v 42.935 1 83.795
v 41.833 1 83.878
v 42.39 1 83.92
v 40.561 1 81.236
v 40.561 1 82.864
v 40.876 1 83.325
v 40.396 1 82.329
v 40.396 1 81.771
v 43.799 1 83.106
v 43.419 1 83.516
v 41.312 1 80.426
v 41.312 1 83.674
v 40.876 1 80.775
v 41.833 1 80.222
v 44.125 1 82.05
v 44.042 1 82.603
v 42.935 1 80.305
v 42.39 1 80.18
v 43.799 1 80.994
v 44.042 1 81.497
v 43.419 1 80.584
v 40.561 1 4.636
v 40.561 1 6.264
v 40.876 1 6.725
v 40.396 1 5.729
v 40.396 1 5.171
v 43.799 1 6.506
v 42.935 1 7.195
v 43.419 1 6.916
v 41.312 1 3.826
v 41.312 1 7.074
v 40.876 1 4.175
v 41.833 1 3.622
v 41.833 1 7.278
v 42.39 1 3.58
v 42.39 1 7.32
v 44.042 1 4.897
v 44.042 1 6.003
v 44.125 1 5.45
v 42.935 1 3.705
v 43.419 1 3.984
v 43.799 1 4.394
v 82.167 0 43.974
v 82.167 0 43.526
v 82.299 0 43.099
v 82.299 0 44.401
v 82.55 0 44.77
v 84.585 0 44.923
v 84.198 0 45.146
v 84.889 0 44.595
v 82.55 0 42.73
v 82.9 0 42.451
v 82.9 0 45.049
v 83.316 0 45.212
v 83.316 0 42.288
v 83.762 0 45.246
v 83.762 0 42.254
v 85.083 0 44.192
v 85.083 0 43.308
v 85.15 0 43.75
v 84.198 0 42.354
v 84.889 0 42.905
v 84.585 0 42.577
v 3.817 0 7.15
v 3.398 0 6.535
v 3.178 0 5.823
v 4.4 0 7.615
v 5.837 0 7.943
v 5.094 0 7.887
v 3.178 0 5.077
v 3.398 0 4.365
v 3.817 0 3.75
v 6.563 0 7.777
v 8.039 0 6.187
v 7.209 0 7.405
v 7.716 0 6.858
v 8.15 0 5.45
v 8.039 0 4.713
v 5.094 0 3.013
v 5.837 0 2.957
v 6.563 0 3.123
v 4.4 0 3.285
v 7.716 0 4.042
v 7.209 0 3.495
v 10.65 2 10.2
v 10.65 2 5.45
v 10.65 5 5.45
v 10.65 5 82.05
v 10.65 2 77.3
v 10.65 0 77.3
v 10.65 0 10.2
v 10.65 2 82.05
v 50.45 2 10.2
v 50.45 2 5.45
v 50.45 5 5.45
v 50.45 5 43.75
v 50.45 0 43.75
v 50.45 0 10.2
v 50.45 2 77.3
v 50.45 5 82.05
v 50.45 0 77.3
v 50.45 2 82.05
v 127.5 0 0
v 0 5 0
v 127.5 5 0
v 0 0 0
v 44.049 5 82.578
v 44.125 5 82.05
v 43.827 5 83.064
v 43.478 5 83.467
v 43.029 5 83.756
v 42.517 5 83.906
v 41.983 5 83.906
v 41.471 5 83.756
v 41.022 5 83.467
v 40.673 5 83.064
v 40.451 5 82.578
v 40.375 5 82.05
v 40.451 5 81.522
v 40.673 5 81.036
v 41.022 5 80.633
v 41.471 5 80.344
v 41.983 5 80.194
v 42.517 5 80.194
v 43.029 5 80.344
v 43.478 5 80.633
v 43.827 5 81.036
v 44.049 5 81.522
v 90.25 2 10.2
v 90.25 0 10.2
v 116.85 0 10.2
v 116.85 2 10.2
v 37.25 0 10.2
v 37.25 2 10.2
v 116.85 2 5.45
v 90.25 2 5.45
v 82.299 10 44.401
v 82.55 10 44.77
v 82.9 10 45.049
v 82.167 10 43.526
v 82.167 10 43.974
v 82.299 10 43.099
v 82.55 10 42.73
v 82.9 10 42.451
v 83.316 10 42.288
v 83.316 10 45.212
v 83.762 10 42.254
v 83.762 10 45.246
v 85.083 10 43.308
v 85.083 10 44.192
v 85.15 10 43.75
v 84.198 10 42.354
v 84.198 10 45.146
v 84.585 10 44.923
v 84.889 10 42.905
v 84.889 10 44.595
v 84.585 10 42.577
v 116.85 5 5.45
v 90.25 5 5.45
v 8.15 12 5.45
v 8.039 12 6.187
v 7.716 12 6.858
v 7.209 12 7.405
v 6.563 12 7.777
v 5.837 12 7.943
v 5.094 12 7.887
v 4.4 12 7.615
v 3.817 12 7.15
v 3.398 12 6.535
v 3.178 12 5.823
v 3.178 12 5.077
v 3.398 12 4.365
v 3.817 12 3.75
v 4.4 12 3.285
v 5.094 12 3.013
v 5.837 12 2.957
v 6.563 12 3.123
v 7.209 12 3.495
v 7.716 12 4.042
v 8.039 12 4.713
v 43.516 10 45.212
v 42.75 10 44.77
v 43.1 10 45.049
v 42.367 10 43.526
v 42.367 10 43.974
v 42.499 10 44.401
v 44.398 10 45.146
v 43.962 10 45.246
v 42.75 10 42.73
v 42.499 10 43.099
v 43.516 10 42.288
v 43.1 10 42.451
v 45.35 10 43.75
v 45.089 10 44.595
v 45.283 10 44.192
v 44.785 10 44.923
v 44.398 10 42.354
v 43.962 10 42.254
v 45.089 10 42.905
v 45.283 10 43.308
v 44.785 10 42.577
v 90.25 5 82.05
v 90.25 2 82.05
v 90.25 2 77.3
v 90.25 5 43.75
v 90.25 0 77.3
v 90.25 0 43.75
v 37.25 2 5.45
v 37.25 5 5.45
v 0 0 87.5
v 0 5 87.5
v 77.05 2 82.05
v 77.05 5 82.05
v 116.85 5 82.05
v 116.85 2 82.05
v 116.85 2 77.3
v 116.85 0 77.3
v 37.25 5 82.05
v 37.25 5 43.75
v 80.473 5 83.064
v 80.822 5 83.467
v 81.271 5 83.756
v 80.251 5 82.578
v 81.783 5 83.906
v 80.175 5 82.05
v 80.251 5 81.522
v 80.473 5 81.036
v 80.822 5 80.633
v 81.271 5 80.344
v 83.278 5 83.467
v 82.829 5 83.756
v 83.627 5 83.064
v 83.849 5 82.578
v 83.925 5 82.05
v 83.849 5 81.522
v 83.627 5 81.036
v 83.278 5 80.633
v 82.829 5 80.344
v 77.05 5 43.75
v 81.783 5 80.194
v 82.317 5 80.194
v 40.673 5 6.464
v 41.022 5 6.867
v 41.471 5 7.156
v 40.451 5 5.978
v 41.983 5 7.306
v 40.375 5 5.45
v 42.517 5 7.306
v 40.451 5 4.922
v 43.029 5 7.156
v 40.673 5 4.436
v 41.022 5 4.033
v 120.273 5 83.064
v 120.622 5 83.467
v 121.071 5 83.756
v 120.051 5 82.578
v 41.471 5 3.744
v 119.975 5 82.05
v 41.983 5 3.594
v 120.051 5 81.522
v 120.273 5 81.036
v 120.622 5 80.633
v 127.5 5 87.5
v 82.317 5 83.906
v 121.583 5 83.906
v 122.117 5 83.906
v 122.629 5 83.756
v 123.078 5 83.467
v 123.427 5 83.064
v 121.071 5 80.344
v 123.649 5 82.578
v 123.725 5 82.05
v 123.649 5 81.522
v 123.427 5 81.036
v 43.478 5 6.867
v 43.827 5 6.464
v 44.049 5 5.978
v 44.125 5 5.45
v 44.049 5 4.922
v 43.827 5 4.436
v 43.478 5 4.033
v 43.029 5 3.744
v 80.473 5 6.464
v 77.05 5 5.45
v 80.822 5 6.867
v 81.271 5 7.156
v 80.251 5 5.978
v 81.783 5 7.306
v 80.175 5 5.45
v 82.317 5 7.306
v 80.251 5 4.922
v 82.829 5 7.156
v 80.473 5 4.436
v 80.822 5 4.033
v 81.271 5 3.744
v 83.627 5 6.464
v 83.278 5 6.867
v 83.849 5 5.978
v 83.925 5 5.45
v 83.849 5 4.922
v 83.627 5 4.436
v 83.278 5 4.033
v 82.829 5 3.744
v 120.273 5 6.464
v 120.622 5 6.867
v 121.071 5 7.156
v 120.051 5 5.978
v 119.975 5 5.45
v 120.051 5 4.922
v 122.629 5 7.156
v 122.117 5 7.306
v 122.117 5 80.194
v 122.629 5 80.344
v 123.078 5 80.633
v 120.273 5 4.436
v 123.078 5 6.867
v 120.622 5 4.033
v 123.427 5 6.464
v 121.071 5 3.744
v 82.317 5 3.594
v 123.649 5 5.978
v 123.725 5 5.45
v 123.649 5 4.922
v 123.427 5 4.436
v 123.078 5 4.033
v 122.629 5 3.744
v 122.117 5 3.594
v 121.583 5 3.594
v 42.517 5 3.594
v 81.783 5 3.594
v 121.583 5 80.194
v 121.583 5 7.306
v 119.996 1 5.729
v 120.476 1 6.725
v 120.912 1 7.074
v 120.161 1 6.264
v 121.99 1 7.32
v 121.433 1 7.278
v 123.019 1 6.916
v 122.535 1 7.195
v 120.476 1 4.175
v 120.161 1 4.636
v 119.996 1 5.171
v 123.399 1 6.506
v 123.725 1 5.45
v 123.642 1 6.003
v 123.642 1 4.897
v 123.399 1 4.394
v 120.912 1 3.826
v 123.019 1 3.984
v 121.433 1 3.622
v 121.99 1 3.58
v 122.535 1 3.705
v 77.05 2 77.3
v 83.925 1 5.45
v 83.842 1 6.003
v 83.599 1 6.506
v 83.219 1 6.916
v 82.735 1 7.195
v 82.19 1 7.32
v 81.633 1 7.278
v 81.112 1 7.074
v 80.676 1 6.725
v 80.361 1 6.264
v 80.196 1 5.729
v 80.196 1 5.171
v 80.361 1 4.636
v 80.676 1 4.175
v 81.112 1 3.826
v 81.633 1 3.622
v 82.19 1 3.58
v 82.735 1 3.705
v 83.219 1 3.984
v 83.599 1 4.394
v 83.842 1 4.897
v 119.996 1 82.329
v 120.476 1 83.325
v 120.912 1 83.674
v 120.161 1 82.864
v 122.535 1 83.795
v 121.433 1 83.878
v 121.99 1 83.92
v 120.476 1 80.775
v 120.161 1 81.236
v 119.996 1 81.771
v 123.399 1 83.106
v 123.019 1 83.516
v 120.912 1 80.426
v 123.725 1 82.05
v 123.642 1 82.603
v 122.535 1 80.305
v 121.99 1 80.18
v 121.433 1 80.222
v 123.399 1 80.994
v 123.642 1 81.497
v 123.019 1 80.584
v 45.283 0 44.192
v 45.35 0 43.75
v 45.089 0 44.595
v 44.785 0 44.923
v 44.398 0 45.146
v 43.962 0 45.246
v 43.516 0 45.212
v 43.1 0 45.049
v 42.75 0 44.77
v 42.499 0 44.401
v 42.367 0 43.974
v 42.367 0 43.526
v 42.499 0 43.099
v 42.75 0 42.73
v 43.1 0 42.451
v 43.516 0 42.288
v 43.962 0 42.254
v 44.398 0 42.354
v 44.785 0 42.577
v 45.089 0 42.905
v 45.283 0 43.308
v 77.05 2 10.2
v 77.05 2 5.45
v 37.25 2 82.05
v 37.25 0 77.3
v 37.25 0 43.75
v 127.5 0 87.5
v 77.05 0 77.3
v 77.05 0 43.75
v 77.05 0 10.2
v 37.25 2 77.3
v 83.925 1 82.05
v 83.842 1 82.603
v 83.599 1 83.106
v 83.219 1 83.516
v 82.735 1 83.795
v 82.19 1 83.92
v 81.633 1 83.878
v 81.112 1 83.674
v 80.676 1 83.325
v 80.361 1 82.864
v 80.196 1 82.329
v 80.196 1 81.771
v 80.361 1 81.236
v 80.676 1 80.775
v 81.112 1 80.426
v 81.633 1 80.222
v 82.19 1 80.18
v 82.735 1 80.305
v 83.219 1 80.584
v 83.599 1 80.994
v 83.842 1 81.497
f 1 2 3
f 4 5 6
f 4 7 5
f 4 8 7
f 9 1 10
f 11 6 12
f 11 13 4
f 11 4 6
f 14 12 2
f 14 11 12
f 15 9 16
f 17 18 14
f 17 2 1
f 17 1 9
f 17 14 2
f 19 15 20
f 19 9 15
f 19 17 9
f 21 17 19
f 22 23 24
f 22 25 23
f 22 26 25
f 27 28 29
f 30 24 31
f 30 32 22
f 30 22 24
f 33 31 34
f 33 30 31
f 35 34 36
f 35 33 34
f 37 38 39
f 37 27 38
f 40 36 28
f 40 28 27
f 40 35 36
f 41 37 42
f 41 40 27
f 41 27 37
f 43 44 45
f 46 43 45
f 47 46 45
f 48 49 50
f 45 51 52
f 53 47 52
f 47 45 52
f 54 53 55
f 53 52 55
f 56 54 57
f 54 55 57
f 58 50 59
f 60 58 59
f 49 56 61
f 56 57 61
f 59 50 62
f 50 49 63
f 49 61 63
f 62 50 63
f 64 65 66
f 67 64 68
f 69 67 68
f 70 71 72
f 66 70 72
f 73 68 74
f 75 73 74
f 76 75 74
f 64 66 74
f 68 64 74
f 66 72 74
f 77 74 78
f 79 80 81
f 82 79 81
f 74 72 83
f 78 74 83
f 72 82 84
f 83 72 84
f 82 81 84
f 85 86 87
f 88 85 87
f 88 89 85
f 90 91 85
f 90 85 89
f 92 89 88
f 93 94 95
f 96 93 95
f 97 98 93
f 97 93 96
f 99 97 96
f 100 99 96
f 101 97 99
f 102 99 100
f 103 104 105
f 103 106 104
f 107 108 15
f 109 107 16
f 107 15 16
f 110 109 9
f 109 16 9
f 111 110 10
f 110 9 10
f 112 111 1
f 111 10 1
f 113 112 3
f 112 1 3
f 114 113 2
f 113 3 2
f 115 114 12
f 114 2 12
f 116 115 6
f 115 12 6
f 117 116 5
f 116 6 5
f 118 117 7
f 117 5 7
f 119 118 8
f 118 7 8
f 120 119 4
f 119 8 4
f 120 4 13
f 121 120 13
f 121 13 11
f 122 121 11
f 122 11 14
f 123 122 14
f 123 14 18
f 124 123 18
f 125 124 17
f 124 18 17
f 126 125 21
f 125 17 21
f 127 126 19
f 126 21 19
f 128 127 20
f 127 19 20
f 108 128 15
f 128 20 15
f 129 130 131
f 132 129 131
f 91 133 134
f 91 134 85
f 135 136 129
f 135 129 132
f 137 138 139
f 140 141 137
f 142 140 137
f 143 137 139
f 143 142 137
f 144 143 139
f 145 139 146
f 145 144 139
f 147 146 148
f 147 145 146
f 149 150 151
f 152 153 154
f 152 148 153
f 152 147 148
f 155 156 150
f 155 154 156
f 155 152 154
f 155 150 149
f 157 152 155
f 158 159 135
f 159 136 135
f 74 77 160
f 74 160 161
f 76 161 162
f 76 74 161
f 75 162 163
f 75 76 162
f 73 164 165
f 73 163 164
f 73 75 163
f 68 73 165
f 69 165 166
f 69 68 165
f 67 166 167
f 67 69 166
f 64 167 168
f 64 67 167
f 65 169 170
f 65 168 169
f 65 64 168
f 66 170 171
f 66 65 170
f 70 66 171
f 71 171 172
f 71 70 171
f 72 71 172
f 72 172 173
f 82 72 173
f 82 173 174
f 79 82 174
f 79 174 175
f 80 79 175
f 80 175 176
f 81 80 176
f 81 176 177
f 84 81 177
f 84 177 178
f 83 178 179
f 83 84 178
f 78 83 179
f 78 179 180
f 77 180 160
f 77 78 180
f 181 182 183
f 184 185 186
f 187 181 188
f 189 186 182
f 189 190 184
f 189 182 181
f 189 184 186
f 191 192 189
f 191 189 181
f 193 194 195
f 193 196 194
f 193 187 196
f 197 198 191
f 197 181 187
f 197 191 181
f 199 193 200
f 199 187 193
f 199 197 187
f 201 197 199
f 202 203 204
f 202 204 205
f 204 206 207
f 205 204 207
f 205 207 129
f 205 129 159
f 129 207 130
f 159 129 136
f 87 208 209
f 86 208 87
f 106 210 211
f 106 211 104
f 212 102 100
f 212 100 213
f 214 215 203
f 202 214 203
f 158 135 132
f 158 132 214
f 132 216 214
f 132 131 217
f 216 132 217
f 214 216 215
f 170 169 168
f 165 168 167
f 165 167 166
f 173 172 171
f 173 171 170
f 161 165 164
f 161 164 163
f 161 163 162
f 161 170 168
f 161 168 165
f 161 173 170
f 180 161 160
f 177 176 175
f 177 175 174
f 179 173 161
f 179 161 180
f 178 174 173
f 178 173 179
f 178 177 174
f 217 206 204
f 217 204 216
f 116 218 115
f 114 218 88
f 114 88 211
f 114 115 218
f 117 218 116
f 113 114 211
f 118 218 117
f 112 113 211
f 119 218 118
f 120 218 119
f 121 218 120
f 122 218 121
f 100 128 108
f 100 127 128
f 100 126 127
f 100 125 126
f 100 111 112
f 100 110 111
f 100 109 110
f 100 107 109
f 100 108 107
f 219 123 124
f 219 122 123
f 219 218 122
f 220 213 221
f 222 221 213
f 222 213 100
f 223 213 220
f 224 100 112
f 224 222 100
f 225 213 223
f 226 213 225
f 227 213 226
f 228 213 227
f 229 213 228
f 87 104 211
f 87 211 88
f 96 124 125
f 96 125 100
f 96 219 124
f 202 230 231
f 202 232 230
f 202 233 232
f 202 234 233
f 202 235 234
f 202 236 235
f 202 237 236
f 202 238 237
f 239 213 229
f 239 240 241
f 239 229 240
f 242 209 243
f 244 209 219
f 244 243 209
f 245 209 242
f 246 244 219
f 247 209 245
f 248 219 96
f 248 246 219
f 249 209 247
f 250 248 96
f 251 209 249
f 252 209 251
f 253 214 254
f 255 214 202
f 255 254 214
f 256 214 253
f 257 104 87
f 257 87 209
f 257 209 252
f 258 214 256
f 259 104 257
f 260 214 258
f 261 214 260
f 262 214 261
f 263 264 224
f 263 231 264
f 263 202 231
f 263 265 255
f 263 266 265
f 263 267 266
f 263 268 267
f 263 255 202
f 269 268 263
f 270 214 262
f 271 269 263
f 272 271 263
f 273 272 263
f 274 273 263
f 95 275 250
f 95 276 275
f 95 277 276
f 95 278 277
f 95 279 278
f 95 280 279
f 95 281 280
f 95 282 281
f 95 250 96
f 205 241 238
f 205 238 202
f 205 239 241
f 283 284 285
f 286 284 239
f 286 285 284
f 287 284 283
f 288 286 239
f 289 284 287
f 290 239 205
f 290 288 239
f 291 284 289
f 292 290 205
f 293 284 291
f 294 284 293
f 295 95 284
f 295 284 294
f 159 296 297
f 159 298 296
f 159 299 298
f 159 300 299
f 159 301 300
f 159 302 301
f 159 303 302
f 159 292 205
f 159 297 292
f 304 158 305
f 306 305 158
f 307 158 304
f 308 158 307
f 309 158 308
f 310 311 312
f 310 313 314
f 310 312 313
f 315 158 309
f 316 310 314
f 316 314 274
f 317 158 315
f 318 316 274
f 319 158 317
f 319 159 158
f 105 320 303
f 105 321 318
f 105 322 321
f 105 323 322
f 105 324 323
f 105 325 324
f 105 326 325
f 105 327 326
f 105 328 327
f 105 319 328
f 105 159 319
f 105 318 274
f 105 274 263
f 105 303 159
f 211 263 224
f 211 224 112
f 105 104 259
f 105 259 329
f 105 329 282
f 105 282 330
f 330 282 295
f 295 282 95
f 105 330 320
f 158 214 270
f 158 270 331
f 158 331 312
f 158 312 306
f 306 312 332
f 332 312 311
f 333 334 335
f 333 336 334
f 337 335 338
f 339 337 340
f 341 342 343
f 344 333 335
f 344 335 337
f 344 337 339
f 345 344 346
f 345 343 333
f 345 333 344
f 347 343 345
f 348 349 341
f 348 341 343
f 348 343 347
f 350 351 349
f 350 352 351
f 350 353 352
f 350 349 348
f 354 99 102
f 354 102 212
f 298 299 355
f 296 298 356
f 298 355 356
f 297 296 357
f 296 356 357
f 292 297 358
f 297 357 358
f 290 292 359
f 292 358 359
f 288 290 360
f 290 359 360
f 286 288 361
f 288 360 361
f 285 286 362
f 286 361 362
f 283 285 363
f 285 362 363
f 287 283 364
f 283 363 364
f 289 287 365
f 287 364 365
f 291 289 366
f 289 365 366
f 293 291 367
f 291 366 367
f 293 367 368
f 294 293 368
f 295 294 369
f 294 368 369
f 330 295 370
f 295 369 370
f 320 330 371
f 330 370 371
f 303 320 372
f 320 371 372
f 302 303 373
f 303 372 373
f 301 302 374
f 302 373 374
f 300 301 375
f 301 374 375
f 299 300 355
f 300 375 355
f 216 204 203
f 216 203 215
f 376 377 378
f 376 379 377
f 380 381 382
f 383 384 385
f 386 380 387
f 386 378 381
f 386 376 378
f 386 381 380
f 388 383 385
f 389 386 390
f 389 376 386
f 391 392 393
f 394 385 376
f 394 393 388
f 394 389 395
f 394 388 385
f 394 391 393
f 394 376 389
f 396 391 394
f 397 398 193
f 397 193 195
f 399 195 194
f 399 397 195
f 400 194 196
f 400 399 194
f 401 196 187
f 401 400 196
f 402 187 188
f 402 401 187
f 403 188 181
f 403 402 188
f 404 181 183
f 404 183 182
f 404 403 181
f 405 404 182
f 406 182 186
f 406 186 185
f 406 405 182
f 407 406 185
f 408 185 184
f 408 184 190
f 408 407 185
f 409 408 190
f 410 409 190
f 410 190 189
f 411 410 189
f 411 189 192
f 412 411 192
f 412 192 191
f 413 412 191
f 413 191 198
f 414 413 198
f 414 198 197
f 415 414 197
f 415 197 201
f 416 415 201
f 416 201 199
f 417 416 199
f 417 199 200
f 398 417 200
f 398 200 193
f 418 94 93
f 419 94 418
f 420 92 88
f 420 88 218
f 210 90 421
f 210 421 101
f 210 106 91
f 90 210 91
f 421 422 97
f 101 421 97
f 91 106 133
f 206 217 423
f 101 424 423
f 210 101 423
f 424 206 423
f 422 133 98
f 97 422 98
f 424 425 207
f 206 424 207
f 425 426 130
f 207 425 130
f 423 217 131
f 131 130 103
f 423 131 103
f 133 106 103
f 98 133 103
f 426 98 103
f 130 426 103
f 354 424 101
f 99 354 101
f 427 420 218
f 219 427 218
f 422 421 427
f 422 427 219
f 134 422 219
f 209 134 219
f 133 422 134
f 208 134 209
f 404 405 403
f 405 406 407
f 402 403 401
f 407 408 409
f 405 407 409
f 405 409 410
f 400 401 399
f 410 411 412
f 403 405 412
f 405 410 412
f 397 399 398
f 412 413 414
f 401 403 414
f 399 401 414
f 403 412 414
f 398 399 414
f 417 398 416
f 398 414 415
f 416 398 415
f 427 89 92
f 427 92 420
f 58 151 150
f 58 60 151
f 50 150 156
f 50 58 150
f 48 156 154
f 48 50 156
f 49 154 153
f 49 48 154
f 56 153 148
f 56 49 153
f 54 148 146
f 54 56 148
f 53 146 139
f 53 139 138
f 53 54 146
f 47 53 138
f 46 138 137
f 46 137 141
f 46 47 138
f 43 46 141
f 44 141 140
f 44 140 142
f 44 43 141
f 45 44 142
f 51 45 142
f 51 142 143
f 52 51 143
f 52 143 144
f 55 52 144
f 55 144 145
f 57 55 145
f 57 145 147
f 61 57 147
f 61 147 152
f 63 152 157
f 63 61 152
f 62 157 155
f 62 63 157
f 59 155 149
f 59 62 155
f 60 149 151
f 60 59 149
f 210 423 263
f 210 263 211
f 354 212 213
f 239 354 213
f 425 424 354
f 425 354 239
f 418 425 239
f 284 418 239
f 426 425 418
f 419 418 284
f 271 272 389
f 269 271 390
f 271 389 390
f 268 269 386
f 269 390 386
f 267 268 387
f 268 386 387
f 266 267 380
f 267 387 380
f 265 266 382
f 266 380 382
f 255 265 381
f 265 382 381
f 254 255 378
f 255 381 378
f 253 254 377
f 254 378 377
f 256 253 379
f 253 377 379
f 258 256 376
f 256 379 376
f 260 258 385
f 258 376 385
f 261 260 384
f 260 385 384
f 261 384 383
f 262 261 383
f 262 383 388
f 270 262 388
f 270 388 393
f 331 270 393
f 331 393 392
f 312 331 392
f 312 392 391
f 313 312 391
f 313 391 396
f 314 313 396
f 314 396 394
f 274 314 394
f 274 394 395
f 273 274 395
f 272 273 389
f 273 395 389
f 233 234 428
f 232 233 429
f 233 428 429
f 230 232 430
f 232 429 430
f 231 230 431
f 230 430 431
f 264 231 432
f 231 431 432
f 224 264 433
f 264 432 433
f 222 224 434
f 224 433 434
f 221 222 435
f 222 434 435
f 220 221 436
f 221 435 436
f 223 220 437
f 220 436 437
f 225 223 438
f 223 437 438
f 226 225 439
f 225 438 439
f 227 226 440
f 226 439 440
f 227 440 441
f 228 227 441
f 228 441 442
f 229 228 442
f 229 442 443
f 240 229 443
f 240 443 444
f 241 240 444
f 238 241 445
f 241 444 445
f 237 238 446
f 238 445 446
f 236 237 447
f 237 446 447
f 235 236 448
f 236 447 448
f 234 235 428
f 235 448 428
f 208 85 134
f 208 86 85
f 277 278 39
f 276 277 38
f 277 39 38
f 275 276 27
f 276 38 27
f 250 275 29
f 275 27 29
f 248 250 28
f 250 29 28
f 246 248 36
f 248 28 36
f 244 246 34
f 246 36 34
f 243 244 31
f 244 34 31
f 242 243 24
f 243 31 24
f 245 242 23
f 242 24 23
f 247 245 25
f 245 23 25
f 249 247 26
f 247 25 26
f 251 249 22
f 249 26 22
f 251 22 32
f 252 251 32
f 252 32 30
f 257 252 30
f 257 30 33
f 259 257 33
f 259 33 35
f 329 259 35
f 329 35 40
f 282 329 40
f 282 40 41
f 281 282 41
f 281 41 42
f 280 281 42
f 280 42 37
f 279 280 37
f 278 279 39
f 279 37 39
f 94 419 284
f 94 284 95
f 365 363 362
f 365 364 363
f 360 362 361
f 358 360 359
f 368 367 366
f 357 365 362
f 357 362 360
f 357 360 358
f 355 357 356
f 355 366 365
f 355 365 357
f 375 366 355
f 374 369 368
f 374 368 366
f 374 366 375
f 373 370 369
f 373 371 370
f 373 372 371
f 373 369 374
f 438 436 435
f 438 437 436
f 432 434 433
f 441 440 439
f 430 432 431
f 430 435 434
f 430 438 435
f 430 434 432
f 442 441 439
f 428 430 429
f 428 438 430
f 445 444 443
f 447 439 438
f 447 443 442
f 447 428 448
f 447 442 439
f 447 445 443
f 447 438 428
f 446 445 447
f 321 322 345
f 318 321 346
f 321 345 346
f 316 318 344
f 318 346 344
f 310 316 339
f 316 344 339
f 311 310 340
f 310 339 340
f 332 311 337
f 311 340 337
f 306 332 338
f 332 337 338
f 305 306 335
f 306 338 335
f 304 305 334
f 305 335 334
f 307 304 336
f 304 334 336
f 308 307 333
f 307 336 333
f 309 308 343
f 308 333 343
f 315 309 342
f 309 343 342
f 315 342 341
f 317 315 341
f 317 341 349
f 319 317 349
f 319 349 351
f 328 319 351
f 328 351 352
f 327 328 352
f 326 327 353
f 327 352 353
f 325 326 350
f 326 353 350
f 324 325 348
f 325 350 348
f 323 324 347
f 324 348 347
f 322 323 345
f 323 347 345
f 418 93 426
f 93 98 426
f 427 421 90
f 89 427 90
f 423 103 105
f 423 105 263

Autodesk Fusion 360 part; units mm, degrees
sketch "Sketch1" plane through (0, 0, 0) normal (0, 1, 0) x (1, 0, 0)
  line L0 (0, 0) -> (127.5, 0)
  line L1 (127.5, 0) -> (127.5, -87.5)
  line L2 (127.5, -87.5) -> (0, -87.5)
  line L3 (0, -87.5) -> (0, 0)
  line L4 (0, -43.75) -> (127.5, -43.75) construction
  line L5 (63.75, 0) -> (63.75, -87.5) construction
  line L6 (63.75, -43.75) -> (77.05, -43.75) construction
  line L7 (63.75, -43.75) -> (63.75, -5.45) construction
  line L8 (63.75, -5.45) -> (77.05, -5.45) construction
  line L9 (77.05, -5.45) -> (50.45, -5.45)
  line L10 (50.45, -5.45) -> (50.45, -82.05)
  line L11 (50.45, -82.05) -> (77.05, -82.05)
  line L12 (77.05, -82.05) -> (77.05, -5.45)
  line L13 (50.45, -43.75) -> (37.25, -43.75)
  line L14 (37.25, -43.75) -> (37.25, -5.45)
  line L15 (37.25, -5.45) -> (10.65, -5.45)
  line L16 (10.65, -5.45) -> (10.65, -82.05)
  line L17 (10.65, -82.05) -> (37.25, -82.05)
  line L18 (37.25, -82.05) -> (37.25, -5.45)
  line L19 (77.05, -43.75) -> (90.25, -43.75)
  line L20 (90.25, -43.75) -> (90.25, -5.45)
  line L21 (90.25, -5.45) -> (116.85, -5.45)
  line L22 (116.85, -5.45) -> (116.85, -82.05)
  line L23 (116.85, -82.05) -> (90.25, -82.05)
  line L24 (90.25, -82.05) -> (90.25, -5.45)
  line L25 (37.25, -43.75) -> (23.95, -43.75)
  line L26 (37.25, -5.45) -> (37.25, -10.2)
  line L27 (37.25, -10.2) -> (10.65, -10.2)
  line L28 (10.65, -10.2) -> (10.65, -5.45)
  line L29 (10.65, -5.45) -> (37.25, -5.45)
  line L30 (37.25, -5.45) -> (37.25, -10.2)
  line L31 (50.45, -5.45) -> (50.45, -10.2)
  line L32 (50.45, -10.2) -> (77.05, -10.2)
  line L33 (77.05, -10.2) -> (77.05, -5.45)
  line L34 (77.05, -5.45) -> (50.45, -5.45)
  line L35 (50.45, -5.45) -> (50.45, -10.2)
  line L36 (90.25, -5.45) -> (90.25, -10.2)
  line L37 (90.25, -10.2) -> (116.85, -10.2)
  line L38 (116.85, -10.2) -> (116.85, -5.45)
  line L39 (116.85, -5.45) -> (90.25, -5.45)
  line L40 (90.25, -5.45) -> (90.25, -10.2)
  line L41 (10.65, -82.05) -> (37.25, -82.05)
  line L42 (37.25, -82.05) -> (37.25, -77.3)
  line L43 (37.25, -77.3) -> (10.65, -77.3)
  line L44 (10.65, -77.3) -> (10.65, -82.05)
  line L45 (50.45, -82.05) -> (77.05, -82.05)
  line L46 (77.05, -82.05) -> (77.05, -77.3)
  line L47 (77.05, -77.3) -> (50.45, -77.3)
  line L48 (50.45, -77.3) -> (50.45, -82.05)
  line L49 (116.85, -82.05) -> (90.25, -82.05)
  line L50 (90.25, -82.05) -> (90.25, -77.3)
  line L51 (90.25, -77.3) -> (116.85, -77.3)
  line L52 (116.85, -77.3) -> (116.85, -82.05)
  line L53 (77.05, -43.75) -> (83.65, -43.75)
  circle A0 centre (83.65, -43.75) radius 1.5
  line L54 (37.25, -43.75) -> (43.85, -43.75)
  circle A1 centre (43.85, -43.75) radius 1.5
  line L55 (10.65, -5.45) -> (5.65, -5.45)
  circle A2 centre (5.65, -5.45) radius 2.5
  line L56 (37.25, -5.45) -> (42.25, -5.45)
  circle A3 centre (42.25, -5.45) radius 1.875
  line L57 (77.05, -5.45) -> (82.05, -5.45)
  circle A4 centre (82.05, -5.45) radius 1.875
  line L58 (116.85, -5.45) -> (121.85, -5.45)
  circle A5 centre (121.85, -5.45) radius 1.875
  line L59 (116.85, -82.05) -> (121.85, -82.05)
  circle A6 centre (121.85, -82.05) radius 1.875
  line L60 (77.05, -82.05) -> (82.05, -82.05)
  circle A7 centre (82.05, -82.05) radius 1.875
  line L61 (37.25, -82.05) -> (42.25, -82.05)
  circle A8 centre (42.25, -82.05) radius 1.875
  dimension "d1" = 127.5
  dimension "d2" = 87.5
  dimension "d3" = 13.3
  dimension "d4" = 38.3
  dimension "d5" = 13.3
  dimension "d6" = 26.6
  dimension "d7" = 76.6
  dimension "d8" = 13.2
  dimension "d9" = 38.3
  dimension "d10" = 26.6
  dimension "d11" = 76.6
  dimension "d12" = 13.2
  dimension "d13" = 38.3
  dimension "d14" = 26.6
  dimension "d15" = 76.6
  dimension "d16" = 13.3
  dimension "d17" = 4.75
  dimension "d18" = 4.75
  dimension "d19" = 4.75
  dimension "d20" = 4.75
  dimension "d21" = 26.6
  dimension "d22" = 4.75
  dimension "d23" = 4.75
  dimension "d42" = 6.6
  dimension "d43" = 3
  dimension "d44" = 6.6
  dimension "d45" = 3
  dimension "d50" = 5
  dimension "d51" = 5
  dimension "d56" = 5
  dimension "d57" = 3.75
  dimension "d58" = 5
  dimension "d59" = 3.75
  dimension "d60" = 5
  dimension "d61" = 3.75
  dimension "d62" = 5
  dimension "d63" = 3.75
  dimension "d64" = 5
  dimension "d65" = 3.75
  dimension "d66" = 5
  dimension "d67" = 3.75
extrude "Extrude12" add sketch "Sketch1" along normal blind 15 contours A2 makes body 1
extrude "Extrude10" add sketch "Sketch1" along normal blind 10 separate body contours L13 L54 A1 | L13 L54 A1 makes body 2
extrude "Extrude1" add sketch "Sketch1" along normal blind 5 separate body contours L0 L1 L2 L3 | A5 | A6 | L19 L53 A0 | L19 L53 A0 | A7 | A8 | A2 | A3 | L13 L54 A1 | L13 L54 A1 | A4 makes body 3
extrude "Extrude2" add sketch "Sketch1" along normal blind 1 contours L20 L21 L22 L24 L36 L37 L38 L39 L40 bodies 3
extrude "Extrude3" add sketch "Sketch1" along normal blind 1 contours L9 L10 L12 L31 L32 L33 L34 L35 bodies 3
extrude "Extrude4" add sketch "Sketch1" along normal blind 2 contours L14 L15 L16 L18 L26 L27 L28 L29 L30 bodies 3
extrude "Extrude5" add 1 faces at (68.1833, 1, 7.0333) along direction (0, 1, 0) blind 1 on bodies 3 bodies 3
extrude "Extrude6" add 1 faces at (107.9833, 1, 8.6167) along direction (0, 1, 0) blind 1 on bodies 3 bodies 3
extrude "Extrude7" add sketch "Sketch1" along normal blind 2 contours L16 L17 L18 L41 L42 L43 L44 bodies 3
extrude "Extrude8" add sketch "Sketch1" along normal blind 2 contours L10 L11 L12 L45 L46 L47 L48 bodies 3
extrude "Extrude9" add sketch "Sketch1" along normal blind 2 contours L22 L23 L24 L49 L50 L51 L52 bodies 3
extrude "Extrude11" add sketch "Sketch1" along normal blind 10 separate body contours L19 L53 A0 | L19 L53 A0 makes body 4
extrude "Extrude13" cut 1 faces at (6.0187, 15, 4.9385) along direction (0, -1, 0) blind 3 on bodies 1 bodies 1
extrude "Extrude14" cut sketch "Sketch1" along normal blind 5 contours A8 bodies 3
extrude "Extrude15" cut sketch "Sketch1" along normal blind 5 contours A7 bodies 3
extrude "Extrude16" cut sketch "Sketch1" along normal blind 5 contours A6 bodies 3
extrude "Extrude17" cut sketch "Sketch1" along normal blind 5 contours A5 bodies 3
extrude "Extrude18" add sketch "Sketch1" along normal blind 1 contours A7 bodies 3
extrude "Extrude19" add sketch "Sketch1" along normal blind 1 contours A8 bodies 3
extrude "Extrude20" add sketch "Sketch1" along normal blind 1 contours A6 bodies 3
extrude "Extrude21" add sketch "Sketch1" along normal blind 1 contours A5 bodies 3
extrude "Extrude22" cut sketch "Sketch1" along normal blind 5 contours A4 bodies 3
extrude "Extrude23" add sketch "Sketch1" along normal blind 1 contours A4 bodies 3
extrude "Extrude24" cut sketch "Sketch1" along normal blind 5 contours A3 bodies 3
extrude "Extrude25" add sketch "Sketch1" along normal blind 1 contours A3 bodies 3
